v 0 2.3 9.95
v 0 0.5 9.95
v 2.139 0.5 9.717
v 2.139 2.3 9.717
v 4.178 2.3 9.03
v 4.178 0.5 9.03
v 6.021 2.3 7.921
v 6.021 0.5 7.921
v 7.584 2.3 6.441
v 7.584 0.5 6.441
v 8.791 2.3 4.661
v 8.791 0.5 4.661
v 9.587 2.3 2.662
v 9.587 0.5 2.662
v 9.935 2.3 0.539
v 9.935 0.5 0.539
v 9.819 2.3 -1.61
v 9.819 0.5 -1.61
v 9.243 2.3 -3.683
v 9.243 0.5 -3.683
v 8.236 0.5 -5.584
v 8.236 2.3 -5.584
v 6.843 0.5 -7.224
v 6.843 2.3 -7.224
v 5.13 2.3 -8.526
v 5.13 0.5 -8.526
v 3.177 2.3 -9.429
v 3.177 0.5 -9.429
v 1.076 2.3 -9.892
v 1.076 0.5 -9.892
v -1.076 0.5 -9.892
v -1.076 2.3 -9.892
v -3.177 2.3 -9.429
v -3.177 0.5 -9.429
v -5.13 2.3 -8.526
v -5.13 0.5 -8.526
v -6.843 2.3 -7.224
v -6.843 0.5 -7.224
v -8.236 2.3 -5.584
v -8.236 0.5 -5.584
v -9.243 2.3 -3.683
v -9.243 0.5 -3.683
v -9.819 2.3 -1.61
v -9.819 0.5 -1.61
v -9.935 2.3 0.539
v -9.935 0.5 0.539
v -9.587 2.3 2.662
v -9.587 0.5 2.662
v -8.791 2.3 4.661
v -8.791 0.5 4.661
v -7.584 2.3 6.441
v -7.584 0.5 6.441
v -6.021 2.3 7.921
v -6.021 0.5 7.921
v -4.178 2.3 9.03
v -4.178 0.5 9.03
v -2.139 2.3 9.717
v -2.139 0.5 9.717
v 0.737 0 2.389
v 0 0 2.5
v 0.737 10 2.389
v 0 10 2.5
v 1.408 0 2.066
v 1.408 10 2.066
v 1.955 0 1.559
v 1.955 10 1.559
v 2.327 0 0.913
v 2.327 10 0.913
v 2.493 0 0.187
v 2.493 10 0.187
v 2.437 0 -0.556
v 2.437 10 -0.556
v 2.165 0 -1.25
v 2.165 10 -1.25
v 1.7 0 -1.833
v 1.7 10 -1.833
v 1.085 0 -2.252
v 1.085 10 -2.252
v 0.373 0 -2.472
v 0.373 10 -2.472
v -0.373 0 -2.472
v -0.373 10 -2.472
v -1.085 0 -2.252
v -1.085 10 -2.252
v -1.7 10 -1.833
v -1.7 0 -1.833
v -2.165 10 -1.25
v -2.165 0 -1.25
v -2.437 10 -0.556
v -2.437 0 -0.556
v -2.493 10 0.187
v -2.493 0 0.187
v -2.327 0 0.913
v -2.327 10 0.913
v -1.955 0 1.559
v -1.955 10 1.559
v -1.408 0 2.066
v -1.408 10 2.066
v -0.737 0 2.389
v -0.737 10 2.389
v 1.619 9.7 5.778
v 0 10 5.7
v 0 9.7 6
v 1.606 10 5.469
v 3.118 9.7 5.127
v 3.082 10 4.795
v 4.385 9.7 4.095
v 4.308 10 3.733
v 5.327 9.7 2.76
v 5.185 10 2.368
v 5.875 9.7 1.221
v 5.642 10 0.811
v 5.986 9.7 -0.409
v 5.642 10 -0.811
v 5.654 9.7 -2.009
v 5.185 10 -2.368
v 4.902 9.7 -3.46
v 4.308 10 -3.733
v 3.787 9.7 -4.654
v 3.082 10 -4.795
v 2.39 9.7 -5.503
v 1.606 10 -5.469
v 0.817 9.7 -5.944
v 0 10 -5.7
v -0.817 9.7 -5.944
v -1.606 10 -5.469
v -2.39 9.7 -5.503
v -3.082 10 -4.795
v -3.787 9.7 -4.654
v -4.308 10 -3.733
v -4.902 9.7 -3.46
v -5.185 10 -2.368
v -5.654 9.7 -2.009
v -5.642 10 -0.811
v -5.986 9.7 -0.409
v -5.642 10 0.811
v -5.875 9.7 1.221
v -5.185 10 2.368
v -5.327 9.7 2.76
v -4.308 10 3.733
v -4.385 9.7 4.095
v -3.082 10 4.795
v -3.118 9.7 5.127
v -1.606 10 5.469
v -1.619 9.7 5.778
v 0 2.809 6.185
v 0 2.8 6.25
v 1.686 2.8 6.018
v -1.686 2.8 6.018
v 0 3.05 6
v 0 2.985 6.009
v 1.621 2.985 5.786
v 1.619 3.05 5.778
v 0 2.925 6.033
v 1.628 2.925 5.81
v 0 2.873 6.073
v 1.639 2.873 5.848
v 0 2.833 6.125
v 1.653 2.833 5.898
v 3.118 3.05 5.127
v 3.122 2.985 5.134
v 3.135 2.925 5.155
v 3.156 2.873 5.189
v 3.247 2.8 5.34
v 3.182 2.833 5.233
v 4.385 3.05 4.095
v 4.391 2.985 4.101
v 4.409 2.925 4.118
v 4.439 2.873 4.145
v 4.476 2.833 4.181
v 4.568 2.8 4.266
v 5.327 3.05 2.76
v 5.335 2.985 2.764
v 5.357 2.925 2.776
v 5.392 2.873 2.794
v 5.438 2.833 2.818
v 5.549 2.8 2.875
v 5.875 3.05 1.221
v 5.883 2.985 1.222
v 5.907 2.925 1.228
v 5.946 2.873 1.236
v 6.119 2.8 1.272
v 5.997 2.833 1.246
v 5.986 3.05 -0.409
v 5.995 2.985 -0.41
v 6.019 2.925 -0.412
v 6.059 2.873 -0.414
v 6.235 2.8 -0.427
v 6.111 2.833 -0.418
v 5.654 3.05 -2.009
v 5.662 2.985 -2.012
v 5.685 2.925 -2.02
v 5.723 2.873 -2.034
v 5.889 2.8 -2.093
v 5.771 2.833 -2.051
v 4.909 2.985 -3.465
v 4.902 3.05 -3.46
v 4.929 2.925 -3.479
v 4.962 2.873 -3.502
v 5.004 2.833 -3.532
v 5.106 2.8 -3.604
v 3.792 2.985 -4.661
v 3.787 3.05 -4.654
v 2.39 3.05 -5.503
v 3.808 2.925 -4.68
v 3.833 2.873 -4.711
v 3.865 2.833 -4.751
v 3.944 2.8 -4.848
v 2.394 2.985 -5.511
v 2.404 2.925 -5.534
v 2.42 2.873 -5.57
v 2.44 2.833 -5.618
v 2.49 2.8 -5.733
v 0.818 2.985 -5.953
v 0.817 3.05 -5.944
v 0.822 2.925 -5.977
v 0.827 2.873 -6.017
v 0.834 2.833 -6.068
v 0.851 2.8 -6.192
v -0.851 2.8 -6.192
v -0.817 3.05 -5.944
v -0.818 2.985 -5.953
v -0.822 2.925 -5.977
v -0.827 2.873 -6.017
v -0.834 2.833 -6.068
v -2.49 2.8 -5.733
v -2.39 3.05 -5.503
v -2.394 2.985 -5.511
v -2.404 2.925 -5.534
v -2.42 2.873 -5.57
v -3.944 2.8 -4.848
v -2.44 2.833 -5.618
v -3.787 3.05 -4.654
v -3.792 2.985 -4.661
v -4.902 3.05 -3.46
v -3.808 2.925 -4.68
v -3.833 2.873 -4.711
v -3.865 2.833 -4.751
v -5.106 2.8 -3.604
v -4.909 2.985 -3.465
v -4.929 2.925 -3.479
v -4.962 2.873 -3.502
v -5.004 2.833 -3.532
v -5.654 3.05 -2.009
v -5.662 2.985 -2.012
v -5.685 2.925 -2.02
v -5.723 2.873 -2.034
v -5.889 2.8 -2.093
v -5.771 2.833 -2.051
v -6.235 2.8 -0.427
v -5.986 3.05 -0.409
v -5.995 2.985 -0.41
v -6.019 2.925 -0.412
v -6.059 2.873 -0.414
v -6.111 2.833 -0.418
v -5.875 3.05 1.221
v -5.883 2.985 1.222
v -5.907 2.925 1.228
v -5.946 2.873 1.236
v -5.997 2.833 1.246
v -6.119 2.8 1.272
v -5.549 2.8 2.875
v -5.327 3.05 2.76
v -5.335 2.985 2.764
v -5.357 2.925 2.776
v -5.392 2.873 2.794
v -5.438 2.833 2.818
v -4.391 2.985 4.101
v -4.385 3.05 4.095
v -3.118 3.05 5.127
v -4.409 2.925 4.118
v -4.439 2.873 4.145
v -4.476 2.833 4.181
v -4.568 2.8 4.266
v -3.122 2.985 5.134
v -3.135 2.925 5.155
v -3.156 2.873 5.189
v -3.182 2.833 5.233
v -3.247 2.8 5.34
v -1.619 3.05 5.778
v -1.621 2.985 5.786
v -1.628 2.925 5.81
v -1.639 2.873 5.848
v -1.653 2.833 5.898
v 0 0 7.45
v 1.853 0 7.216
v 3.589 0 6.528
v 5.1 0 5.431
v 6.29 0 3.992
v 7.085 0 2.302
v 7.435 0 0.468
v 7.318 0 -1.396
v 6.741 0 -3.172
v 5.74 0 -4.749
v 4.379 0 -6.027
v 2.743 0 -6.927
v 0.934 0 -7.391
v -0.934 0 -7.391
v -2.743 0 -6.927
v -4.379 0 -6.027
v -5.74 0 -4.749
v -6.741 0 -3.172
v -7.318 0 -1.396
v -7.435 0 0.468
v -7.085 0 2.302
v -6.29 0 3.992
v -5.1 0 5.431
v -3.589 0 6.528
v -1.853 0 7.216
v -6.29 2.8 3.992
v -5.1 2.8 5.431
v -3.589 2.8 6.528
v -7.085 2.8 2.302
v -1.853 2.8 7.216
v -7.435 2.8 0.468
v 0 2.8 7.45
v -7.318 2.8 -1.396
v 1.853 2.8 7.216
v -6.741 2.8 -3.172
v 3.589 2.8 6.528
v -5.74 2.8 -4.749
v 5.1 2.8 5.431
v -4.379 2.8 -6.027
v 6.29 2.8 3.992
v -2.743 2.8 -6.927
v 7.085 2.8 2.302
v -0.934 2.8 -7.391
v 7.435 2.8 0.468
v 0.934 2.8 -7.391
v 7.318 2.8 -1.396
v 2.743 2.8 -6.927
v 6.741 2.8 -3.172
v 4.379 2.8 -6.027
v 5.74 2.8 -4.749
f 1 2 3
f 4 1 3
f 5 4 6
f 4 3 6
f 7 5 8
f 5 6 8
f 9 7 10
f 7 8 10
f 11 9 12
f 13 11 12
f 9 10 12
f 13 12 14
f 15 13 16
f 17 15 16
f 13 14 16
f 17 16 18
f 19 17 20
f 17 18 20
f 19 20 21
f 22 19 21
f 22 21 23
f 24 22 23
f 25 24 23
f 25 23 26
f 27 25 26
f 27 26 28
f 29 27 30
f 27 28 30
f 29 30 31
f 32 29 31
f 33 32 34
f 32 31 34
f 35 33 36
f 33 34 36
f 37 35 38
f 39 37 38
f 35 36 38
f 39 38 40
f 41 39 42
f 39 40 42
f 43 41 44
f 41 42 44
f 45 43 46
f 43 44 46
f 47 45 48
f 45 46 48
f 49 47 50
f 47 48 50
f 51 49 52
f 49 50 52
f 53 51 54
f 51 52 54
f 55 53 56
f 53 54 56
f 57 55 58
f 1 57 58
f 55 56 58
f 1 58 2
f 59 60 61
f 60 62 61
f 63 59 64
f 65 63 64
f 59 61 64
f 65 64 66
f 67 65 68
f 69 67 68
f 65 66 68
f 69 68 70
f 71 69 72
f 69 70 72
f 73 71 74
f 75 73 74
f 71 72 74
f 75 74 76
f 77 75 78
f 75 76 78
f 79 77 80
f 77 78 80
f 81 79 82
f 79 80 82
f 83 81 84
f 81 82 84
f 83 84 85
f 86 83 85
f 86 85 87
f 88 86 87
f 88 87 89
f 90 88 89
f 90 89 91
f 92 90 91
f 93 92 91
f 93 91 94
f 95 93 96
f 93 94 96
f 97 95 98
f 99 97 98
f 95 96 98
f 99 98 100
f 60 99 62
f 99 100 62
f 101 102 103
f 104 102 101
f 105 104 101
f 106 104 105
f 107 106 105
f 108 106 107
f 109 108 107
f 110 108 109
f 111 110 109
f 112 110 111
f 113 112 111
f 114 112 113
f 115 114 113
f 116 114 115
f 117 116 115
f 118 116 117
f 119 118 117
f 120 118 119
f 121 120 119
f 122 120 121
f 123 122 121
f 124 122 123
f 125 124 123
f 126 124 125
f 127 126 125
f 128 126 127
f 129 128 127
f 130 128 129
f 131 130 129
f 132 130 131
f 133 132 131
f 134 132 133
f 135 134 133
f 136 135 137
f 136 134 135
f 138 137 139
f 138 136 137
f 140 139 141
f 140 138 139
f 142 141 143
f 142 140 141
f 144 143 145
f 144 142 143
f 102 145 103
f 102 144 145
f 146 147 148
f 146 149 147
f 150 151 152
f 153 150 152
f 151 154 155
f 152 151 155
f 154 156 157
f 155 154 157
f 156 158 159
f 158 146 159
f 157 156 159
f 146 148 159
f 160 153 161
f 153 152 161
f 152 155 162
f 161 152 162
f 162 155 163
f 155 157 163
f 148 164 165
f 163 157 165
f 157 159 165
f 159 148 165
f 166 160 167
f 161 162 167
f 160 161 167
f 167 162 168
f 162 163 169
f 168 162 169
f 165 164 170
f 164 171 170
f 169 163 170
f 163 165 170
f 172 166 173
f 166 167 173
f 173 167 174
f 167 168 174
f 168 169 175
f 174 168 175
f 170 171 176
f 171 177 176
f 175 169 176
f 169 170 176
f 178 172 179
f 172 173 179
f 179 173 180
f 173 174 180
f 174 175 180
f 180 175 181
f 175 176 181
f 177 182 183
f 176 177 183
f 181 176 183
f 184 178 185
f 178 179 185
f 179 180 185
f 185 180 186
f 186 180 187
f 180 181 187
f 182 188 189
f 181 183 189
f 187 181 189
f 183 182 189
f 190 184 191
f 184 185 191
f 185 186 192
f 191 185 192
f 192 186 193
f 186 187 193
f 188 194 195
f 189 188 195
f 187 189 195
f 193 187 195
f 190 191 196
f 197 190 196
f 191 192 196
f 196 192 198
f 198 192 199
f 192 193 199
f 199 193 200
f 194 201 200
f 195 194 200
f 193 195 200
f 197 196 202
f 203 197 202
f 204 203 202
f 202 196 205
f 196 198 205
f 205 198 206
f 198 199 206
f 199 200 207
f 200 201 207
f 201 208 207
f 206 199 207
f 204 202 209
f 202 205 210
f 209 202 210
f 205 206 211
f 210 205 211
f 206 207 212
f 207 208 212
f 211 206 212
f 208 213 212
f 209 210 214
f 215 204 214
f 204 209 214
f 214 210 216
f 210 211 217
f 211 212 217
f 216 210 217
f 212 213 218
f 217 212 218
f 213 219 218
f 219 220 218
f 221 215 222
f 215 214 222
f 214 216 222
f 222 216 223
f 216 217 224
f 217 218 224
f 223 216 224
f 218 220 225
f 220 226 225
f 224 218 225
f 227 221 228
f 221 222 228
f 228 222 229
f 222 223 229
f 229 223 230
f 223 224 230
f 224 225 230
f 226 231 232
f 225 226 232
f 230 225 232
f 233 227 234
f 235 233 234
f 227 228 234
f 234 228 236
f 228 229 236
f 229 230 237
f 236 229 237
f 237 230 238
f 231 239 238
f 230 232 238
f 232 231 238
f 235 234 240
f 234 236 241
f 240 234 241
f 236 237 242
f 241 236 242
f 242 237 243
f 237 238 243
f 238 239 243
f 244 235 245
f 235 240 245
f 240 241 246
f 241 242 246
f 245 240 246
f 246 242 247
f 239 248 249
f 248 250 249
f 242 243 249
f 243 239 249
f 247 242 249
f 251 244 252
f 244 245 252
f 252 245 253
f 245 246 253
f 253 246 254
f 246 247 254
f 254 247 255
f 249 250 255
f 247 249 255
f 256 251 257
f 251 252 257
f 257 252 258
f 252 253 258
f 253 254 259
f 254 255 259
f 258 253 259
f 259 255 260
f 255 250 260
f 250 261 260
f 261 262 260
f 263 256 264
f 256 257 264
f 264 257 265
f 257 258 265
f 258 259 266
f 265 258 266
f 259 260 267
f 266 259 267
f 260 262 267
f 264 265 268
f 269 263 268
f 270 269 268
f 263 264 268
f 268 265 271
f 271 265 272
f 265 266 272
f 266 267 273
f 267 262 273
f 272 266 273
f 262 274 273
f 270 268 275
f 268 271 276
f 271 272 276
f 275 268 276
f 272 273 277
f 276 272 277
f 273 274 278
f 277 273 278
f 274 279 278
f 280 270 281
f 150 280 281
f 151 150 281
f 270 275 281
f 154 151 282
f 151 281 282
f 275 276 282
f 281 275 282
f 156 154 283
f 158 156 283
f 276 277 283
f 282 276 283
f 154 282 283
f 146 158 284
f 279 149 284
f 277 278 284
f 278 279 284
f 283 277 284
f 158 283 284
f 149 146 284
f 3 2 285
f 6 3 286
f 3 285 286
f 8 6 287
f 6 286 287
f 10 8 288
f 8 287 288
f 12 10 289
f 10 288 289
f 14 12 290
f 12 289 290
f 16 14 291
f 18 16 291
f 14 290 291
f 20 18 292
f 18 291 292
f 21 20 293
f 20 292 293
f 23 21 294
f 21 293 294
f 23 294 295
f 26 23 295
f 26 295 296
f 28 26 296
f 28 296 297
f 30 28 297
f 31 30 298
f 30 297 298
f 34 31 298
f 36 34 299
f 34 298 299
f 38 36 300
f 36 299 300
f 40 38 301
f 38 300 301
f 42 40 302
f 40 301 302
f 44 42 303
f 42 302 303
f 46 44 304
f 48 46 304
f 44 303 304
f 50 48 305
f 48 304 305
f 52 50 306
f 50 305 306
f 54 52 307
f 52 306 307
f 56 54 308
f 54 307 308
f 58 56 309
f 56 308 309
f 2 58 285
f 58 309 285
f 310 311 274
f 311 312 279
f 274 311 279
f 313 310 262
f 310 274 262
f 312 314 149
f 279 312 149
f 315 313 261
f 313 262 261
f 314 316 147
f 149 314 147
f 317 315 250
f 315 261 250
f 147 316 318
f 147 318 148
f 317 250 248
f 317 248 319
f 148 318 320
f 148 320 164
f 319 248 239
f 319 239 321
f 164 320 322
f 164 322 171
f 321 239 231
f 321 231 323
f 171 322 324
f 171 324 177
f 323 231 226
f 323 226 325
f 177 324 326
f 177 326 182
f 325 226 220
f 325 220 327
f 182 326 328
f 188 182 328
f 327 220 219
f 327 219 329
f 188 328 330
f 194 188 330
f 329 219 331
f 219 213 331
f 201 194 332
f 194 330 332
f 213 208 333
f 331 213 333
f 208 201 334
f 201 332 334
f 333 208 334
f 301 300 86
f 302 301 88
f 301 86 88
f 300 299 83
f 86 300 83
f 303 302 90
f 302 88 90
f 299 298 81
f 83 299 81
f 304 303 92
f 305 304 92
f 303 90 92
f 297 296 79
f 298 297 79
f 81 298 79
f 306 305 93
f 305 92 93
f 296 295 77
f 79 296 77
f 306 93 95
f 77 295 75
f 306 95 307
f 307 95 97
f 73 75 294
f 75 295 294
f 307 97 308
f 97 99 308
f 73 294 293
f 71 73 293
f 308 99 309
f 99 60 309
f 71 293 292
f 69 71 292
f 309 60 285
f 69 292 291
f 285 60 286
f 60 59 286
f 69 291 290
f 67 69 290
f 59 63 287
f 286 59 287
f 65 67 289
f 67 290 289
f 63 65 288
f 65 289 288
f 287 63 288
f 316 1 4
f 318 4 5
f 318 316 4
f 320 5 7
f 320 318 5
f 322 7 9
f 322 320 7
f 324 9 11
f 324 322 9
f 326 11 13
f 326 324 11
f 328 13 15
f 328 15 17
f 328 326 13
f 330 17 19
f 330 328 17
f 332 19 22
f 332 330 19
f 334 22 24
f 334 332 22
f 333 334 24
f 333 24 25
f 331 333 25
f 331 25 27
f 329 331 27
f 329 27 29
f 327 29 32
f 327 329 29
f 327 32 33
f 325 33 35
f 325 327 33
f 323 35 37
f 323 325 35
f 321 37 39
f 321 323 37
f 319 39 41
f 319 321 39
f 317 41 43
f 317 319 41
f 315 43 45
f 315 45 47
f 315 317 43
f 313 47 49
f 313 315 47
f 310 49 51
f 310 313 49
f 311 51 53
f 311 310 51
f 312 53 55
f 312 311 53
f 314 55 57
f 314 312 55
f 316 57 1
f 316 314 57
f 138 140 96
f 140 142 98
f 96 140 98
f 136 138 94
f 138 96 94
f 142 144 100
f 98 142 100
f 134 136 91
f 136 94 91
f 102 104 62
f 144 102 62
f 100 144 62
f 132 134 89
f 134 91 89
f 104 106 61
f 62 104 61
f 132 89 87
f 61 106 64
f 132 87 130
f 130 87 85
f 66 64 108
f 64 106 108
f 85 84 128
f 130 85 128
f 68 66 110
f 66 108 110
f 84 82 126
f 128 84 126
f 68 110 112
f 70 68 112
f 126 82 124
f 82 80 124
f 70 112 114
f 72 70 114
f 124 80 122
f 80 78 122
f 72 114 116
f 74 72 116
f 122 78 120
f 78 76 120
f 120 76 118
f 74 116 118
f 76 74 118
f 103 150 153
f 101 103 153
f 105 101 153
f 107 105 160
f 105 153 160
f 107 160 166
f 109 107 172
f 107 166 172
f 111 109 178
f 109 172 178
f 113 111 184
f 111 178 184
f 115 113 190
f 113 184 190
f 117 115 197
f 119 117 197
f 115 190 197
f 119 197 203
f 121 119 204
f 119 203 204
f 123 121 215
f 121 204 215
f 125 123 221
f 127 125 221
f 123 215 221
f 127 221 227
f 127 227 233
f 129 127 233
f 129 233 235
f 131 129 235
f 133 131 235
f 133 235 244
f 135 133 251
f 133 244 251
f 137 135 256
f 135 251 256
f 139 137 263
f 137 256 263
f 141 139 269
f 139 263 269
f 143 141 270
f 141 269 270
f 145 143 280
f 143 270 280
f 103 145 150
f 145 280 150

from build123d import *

# Parameters (mm, degrees)
F2_R     = 0.25
F3_SIZE  = 0.3
F4_SIZE2 = 2.5
F4_SIZE  = 0.5


with BuildPart() as f1:
    # F0 (on Right) → F1 (revolve)
    with BuildSketch(Plane.YZ):
        Polygon((0, 9.95), (0, 2.5), (10, 2.5), (10, 6), (2.8, 6), (2.8, 9.95), align=None)
    revolve(axis=Axis((0, 5.3417352028, 0), (0, 1, 0)))

    # F2
    f2_edges = [f1.edges().sort_by_distance(p)[0] for p in [
        (0, 2.8, -6),
    ]]
    fillet(f2_edges, radius=F2_R)

    # F3
    f3_edges = [f1.edges().sort_by_distance(p)[0] for p in [
        (0, 10, -6),
    ]]
    chamfer(f3_edges, length=F3_SIZE)

    # F4
    f4_edges = [f1.edges().sort_by_distance(p)[0] for p in [
        (0, 0, -9.95),
        (0, 2.8, -9.95),
    ]]
    f4_side = f1.faces().sort_by_distance((0, 1.4, -9.95))[0]
    chamfer(f4_edges, length=F4_SIZE, length2=F4_SIZE2, reference=f4_side)


solid = f1.part
